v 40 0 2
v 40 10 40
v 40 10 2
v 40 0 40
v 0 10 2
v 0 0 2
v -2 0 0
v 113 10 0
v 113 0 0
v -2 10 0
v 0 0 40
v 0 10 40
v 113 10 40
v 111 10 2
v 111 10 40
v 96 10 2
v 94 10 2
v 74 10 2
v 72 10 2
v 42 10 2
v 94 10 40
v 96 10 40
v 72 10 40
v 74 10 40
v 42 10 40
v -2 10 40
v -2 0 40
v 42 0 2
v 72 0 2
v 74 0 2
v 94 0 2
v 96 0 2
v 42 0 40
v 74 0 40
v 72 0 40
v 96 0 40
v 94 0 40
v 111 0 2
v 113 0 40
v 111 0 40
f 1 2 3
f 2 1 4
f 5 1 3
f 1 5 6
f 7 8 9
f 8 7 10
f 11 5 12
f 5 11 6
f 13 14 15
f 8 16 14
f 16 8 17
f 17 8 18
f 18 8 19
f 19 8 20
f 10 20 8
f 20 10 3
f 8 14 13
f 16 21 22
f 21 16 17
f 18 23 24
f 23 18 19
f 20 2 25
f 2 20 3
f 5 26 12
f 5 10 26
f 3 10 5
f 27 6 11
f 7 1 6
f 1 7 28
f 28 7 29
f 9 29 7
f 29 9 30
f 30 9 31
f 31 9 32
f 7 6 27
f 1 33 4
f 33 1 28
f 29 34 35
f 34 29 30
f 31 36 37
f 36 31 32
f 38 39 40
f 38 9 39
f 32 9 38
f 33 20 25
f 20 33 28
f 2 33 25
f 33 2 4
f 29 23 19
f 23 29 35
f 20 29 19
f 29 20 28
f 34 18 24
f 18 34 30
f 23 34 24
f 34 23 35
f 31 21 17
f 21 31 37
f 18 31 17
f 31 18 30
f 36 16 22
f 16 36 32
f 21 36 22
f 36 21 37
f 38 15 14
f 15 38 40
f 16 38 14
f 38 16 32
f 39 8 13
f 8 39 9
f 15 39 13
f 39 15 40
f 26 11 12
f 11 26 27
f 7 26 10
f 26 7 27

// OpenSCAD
module utensilHolder(bottomHeight, wallHeight, wallThickness, width, gapList)
{
    module bottom(gap) { cube([gap, width, bottomHeight]); }
    module wall() { cube([wallThickness, width, wallHeight]); }
    function total_gap_of(n) = ( n==0 ? 0 : gapList[n-1] + wallThickness + total_gap_of(n-1) );
    
    for(i = [0 : 1 : len(gapList)-1])
    {
        translate([total_gap_of(i), 0, 0])
        {
            bottom(gapList[i]);
            translate([gapList[i], 0, 0]) wall();
        }
    }
    translate([-wallThickness, 0 , 0]) wall();
}
// spoons=4cm, forks=3cm, knives=2cm, chopsticks=1.5cm
utensilHolder(2, 40, 2, 10, [40, 30, 20, 15]);
// envelope holder
// utensilHolder(3, 50, 3, 50, [10, 10, 10]);
